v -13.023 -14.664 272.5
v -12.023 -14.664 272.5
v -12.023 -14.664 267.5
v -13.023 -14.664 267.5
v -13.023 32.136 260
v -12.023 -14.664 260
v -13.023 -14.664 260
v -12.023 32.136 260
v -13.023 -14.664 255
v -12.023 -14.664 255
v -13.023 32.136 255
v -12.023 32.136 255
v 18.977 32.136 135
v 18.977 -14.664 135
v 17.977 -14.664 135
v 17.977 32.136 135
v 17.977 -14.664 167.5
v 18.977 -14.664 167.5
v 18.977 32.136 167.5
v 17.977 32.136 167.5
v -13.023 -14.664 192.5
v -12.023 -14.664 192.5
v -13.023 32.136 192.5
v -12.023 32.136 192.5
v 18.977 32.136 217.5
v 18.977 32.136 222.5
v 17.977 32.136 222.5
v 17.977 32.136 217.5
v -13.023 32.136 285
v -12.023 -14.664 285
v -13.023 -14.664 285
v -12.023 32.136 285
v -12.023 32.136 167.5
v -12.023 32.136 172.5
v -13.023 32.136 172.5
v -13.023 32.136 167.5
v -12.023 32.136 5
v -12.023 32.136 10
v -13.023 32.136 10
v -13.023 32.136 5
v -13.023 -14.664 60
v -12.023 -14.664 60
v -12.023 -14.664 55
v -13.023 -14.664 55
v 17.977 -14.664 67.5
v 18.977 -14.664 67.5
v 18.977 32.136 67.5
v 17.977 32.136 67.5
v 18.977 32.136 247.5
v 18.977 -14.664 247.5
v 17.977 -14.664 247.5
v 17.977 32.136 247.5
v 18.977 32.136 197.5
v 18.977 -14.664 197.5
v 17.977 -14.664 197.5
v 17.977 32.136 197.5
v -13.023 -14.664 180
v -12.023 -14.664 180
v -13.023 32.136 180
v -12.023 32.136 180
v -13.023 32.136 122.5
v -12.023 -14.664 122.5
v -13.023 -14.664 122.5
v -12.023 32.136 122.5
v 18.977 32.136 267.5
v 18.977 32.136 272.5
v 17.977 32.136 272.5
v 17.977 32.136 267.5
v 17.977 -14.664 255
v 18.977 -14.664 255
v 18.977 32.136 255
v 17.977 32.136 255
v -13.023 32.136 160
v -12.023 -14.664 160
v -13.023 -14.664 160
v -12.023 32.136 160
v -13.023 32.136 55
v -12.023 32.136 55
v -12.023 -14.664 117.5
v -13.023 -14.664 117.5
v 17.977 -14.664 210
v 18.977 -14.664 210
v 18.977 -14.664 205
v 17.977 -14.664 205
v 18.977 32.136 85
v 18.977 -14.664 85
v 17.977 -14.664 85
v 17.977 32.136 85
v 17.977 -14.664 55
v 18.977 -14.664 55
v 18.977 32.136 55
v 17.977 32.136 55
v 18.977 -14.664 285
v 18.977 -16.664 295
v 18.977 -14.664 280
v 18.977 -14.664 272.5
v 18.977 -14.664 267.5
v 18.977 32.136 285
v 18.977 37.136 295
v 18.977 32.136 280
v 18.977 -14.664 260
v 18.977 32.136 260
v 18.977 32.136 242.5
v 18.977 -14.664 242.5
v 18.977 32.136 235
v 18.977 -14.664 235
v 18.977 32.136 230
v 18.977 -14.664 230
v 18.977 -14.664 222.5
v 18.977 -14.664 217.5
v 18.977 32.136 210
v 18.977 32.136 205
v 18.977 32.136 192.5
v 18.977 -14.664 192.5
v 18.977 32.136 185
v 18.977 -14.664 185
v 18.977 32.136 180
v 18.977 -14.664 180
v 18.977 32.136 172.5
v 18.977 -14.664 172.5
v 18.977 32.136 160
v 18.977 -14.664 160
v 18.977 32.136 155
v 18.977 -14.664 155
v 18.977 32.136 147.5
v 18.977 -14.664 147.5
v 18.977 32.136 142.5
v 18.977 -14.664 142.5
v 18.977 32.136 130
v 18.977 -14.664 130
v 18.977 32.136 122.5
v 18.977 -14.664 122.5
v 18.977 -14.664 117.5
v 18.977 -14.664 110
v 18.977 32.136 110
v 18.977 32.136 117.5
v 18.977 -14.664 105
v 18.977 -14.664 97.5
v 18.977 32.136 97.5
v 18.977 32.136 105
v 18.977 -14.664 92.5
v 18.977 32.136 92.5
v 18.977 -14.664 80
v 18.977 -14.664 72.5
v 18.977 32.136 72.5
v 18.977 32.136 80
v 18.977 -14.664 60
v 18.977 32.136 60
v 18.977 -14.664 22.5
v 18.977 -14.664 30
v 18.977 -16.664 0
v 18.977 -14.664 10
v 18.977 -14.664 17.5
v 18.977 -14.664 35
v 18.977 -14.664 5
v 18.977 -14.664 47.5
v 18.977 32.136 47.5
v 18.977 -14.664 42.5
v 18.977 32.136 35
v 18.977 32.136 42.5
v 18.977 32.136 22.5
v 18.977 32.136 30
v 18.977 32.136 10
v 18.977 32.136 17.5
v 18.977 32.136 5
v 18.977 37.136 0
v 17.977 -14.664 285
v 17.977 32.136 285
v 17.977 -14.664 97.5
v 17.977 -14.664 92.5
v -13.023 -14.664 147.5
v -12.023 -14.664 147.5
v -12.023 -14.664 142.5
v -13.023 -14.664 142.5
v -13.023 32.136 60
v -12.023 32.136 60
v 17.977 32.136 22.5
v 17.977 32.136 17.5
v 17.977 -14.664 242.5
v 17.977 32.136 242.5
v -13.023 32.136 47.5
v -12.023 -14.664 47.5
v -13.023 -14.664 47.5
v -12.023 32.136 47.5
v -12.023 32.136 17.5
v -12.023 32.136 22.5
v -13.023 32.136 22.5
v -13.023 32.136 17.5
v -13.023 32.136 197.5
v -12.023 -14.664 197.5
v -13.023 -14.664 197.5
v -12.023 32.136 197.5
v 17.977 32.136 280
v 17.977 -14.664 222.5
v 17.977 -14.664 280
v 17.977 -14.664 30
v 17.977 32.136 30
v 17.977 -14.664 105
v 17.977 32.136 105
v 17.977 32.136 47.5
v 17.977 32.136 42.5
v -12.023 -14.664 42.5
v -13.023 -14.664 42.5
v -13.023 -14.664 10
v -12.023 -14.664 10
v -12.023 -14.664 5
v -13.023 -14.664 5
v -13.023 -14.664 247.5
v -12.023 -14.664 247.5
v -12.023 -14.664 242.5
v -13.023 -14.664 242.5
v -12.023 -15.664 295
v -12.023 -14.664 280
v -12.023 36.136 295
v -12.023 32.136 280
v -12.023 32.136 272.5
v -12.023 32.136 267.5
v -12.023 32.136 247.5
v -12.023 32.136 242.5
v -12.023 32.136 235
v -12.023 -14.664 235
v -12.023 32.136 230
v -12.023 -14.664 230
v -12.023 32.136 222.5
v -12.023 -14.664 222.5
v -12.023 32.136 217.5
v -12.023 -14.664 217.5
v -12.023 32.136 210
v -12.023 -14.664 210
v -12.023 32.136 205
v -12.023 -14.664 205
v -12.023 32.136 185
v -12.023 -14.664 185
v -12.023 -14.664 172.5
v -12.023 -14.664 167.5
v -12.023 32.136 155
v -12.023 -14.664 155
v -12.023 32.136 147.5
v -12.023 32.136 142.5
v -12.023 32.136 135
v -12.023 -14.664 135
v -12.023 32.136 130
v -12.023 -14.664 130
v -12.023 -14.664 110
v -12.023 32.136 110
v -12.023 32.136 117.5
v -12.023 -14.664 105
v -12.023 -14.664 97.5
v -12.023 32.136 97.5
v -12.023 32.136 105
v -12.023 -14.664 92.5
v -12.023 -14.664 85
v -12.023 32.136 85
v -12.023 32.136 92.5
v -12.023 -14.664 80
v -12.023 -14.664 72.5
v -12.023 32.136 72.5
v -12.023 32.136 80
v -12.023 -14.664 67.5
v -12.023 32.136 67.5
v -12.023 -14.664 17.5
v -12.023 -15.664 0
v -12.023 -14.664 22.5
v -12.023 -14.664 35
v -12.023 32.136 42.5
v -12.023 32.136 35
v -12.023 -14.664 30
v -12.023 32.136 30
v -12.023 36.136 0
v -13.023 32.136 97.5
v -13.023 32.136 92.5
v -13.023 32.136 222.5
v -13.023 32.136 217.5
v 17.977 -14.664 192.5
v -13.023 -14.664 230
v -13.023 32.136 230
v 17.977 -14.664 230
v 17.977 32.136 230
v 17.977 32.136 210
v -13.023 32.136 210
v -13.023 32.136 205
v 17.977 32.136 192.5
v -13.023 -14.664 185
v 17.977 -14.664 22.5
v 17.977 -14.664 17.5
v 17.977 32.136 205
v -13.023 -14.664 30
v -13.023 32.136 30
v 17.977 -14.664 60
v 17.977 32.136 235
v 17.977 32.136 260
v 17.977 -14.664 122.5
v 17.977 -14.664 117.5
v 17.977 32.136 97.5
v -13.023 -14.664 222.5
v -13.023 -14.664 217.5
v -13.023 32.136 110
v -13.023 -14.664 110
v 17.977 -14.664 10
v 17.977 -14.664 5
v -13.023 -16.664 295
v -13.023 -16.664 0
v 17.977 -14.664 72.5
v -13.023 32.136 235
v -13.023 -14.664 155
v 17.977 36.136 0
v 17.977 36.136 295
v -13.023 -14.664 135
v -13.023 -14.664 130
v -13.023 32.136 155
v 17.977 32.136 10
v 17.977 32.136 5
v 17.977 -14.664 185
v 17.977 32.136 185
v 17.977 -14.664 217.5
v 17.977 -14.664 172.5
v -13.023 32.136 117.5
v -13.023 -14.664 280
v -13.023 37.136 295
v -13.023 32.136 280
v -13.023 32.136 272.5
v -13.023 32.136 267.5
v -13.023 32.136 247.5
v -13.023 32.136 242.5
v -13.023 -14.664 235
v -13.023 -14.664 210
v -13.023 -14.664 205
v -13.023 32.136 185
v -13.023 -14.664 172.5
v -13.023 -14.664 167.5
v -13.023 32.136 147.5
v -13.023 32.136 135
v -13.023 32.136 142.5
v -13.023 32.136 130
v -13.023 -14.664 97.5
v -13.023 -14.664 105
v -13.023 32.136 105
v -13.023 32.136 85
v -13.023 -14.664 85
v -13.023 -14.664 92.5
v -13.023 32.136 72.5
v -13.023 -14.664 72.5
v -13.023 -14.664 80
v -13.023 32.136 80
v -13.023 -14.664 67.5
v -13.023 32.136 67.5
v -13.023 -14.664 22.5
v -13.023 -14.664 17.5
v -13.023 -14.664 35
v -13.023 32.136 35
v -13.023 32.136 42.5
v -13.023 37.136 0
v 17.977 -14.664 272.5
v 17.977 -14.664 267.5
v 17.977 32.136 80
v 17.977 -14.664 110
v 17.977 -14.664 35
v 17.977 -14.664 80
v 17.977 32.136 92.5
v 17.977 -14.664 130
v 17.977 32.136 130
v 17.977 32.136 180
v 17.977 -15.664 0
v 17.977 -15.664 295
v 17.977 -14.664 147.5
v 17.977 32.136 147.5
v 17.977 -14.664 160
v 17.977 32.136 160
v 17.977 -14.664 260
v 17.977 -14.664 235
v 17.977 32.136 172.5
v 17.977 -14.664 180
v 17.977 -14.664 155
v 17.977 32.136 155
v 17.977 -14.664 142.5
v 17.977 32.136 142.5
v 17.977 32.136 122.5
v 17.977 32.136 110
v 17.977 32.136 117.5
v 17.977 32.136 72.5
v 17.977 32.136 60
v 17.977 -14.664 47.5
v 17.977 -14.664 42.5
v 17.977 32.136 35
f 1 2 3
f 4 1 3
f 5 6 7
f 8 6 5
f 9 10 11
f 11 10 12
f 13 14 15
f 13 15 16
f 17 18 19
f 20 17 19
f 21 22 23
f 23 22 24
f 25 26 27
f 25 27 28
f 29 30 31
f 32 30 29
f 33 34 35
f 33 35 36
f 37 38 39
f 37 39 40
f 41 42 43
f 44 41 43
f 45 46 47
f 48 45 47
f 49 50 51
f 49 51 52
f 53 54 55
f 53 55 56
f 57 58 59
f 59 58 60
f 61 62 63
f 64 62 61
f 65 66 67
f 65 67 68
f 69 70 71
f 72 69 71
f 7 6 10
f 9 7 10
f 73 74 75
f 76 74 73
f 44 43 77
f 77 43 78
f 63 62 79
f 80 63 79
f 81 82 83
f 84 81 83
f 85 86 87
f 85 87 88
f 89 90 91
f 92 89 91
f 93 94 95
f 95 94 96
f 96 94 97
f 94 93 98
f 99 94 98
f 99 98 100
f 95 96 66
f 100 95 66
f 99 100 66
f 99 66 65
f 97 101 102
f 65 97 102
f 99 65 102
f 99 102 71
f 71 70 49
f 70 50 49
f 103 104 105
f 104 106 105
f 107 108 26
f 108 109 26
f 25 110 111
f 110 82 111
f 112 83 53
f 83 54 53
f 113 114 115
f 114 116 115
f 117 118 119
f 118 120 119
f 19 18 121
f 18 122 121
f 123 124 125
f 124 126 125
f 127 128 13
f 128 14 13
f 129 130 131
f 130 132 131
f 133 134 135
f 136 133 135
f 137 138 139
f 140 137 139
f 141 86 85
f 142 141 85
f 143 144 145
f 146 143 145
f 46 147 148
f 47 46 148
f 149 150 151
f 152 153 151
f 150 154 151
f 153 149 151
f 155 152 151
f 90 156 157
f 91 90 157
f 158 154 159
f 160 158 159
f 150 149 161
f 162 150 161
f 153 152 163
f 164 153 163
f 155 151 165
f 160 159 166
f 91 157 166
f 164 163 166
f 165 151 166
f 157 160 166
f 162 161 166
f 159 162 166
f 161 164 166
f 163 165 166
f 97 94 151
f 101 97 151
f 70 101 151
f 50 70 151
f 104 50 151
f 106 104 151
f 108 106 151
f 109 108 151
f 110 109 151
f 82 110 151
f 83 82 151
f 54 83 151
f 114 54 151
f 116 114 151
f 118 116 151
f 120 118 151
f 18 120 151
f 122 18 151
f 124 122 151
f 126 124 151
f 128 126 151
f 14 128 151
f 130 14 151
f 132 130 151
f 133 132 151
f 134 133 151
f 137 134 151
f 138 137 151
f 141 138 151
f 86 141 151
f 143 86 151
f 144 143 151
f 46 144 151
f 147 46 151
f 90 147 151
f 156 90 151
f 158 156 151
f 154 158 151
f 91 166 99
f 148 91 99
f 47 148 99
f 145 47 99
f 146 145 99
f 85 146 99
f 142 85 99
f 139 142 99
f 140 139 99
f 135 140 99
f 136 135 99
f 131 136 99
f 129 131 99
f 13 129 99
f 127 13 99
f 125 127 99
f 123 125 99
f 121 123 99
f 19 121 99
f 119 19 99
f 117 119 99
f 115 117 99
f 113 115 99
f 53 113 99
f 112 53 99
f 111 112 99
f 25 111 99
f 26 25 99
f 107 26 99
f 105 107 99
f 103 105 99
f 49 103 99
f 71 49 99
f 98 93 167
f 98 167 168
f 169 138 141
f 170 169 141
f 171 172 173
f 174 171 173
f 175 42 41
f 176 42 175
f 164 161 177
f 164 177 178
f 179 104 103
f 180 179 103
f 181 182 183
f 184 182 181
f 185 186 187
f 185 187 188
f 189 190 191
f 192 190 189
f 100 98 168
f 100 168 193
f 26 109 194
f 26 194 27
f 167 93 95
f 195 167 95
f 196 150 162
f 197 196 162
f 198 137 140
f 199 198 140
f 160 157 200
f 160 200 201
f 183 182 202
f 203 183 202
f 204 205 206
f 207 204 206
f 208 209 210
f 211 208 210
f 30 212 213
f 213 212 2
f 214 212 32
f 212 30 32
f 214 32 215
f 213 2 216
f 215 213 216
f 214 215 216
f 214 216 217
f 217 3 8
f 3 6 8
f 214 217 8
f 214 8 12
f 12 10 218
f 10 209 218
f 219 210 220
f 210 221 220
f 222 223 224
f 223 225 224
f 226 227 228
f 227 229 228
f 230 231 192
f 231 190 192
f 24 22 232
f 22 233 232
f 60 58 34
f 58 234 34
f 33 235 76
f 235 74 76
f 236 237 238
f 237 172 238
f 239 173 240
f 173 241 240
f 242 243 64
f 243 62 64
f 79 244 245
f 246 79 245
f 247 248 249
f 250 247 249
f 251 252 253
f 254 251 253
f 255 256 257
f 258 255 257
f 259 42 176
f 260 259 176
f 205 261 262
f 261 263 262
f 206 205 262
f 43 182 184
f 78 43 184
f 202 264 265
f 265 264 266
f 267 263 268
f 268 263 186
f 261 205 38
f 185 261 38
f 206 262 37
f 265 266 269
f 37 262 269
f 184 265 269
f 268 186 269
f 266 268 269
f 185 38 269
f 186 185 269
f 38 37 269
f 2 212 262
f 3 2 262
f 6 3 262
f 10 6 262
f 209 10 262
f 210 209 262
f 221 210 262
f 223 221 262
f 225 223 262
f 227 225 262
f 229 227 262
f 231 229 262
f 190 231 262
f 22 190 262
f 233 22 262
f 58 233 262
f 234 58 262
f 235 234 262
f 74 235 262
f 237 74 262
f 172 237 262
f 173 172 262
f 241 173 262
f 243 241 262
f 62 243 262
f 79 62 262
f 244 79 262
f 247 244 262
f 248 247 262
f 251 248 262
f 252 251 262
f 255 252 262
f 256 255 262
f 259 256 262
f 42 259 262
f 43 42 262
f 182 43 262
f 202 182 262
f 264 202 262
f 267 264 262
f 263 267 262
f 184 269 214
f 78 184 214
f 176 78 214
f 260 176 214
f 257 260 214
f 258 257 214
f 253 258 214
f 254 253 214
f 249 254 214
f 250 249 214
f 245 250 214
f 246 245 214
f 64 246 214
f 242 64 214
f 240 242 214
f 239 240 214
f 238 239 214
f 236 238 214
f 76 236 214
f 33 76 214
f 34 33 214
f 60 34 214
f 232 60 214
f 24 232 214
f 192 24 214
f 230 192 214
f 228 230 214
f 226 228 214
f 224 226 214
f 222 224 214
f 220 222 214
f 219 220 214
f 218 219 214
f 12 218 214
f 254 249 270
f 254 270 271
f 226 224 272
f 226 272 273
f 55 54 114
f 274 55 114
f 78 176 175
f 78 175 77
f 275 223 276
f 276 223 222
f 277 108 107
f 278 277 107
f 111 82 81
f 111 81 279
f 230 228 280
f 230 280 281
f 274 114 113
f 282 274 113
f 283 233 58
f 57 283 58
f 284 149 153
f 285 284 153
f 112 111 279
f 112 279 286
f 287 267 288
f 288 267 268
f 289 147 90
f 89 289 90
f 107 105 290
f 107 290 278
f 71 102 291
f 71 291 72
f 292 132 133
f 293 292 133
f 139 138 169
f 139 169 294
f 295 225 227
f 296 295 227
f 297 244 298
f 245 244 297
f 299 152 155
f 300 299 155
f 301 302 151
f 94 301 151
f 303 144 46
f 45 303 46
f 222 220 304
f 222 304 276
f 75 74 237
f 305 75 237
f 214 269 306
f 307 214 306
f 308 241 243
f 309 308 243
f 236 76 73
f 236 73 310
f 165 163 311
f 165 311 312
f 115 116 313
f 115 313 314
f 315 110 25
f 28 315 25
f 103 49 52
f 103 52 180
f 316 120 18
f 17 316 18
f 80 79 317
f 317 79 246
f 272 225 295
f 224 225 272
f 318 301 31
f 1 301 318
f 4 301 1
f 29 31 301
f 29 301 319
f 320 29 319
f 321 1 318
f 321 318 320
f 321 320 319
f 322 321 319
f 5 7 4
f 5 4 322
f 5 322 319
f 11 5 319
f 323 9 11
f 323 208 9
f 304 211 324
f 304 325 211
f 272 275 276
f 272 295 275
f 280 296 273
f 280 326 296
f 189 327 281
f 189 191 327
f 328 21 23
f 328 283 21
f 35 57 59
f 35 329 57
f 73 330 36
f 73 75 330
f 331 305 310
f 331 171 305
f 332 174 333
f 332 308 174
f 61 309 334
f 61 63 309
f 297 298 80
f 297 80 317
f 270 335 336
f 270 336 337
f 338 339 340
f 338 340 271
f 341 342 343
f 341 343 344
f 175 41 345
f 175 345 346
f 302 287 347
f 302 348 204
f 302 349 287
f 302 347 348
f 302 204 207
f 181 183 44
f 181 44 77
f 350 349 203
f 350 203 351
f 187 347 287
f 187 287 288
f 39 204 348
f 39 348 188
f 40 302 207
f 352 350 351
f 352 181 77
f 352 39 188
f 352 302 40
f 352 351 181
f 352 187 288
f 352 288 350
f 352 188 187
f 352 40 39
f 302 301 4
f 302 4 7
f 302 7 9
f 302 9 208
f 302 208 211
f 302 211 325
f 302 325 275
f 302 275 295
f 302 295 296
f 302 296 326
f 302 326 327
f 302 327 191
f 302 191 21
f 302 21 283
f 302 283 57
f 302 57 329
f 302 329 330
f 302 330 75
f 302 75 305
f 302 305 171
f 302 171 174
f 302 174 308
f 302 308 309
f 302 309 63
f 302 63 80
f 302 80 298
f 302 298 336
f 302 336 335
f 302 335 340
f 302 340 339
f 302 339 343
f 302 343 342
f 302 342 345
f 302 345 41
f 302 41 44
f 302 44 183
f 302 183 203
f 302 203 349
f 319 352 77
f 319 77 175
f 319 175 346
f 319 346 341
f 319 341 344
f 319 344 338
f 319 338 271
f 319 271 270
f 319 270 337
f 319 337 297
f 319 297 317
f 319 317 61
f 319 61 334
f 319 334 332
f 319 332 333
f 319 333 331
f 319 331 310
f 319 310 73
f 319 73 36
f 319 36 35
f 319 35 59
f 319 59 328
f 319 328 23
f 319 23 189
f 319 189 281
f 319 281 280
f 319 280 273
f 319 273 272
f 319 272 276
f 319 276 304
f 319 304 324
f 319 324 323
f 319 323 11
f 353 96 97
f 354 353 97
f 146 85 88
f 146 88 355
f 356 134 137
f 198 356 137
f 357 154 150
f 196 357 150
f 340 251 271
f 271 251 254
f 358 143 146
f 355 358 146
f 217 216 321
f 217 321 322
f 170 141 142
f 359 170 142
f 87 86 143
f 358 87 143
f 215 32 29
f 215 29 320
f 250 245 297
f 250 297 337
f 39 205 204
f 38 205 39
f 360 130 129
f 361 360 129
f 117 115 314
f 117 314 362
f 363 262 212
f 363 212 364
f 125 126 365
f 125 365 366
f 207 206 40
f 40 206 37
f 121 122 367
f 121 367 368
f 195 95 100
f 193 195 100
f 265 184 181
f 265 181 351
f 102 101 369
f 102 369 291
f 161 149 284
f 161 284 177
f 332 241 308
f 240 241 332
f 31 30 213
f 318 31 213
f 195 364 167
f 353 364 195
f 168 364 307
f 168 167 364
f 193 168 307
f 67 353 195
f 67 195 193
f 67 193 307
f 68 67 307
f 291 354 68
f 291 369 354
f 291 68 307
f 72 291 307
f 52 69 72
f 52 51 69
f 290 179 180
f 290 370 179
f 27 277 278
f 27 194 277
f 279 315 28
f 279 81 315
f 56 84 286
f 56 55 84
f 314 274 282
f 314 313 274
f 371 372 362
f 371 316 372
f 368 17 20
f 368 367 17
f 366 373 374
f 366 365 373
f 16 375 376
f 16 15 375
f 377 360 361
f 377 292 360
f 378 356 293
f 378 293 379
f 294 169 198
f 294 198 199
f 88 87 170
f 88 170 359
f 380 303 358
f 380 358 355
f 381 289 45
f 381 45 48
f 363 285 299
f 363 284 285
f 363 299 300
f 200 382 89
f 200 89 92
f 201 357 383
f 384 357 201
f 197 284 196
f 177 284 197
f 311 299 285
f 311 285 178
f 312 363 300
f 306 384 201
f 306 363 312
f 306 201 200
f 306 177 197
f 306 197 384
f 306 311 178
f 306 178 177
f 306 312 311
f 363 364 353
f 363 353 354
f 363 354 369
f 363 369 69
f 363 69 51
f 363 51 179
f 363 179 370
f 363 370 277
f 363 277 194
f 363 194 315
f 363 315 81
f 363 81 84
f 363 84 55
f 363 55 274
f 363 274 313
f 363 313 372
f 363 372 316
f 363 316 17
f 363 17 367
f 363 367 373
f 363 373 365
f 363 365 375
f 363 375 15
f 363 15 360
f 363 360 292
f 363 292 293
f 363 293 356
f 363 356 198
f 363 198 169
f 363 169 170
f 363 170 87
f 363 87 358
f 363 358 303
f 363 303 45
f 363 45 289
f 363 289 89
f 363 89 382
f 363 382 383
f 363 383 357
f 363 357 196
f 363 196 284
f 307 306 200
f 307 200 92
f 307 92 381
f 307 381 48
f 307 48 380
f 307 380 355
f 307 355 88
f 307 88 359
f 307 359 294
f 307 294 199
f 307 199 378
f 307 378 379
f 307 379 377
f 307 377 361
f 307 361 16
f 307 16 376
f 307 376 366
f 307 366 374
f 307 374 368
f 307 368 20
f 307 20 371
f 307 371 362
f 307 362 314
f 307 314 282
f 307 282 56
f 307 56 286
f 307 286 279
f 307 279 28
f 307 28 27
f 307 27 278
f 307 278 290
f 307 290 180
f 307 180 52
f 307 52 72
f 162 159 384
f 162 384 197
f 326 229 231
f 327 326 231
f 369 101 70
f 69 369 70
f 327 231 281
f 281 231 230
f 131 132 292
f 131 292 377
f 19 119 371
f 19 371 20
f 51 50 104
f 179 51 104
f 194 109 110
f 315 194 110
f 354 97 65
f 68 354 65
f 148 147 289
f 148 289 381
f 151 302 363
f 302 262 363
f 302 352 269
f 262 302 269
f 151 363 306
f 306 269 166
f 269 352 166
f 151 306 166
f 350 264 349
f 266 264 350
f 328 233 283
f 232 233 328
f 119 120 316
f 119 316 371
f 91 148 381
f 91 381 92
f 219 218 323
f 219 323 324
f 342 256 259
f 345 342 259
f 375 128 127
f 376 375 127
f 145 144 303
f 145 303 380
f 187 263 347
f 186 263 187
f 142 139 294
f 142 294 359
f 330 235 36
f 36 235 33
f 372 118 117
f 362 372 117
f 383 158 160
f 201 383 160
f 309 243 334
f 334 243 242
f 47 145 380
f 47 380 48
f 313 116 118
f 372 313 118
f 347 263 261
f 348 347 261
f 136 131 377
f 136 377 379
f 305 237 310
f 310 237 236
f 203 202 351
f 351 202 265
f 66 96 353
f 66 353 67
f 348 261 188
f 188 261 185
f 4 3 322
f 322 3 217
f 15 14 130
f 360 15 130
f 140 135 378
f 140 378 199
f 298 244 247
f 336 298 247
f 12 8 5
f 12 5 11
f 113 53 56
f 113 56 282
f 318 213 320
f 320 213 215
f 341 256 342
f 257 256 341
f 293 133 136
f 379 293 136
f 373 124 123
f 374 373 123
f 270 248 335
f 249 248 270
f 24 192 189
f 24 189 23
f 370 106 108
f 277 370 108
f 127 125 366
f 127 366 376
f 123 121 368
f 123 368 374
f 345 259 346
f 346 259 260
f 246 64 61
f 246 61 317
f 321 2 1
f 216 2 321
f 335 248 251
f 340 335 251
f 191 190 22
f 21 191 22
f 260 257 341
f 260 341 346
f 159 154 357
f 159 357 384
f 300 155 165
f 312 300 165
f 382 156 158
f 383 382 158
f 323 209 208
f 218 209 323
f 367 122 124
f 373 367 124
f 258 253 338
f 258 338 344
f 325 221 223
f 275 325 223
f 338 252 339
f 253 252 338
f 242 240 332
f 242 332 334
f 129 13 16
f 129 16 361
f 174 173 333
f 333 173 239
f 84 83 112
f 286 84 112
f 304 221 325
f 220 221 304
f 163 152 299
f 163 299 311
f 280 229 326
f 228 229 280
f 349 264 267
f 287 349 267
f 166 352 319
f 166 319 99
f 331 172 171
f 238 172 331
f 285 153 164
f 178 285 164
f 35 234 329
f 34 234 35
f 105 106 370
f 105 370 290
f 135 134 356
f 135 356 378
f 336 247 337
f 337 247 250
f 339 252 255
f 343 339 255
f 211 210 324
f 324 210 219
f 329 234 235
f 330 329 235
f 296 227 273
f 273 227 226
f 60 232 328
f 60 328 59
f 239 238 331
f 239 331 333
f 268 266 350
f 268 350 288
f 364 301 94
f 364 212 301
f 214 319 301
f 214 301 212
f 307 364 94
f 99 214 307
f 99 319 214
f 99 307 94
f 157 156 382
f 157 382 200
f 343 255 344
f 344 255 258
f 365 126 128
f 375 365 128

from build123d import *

# Parameters (mm, degrees)
ESQUISSE1_W                = 32
ESQUISSE1_H                = 53.8
ESQUISSE1_W_2              = 30
ESQUISSE1_H_2              = 51.8
BOSS_EXTRU_1_DEPTH         = 295
ESQUISSE2_W                = 5
ESQUISSE2_H                = 46.8
ENL_V_MAT_EXTRU_1_DEPTH    = 32
R_P_TITION_LIN_AIRE1_COUNT = 23
R_P_TITION_LIN_AIRE1_PITCH = 12.5


with BuildPart() as part:
    # Esquisse1 → Boss.-Extru.1 (new body)
    with BuildSketch(Plane.XY):
        with Locations((2.977116986, 10.236099585)):
            Rectangle(ESQUISSE1_W, ESQUISSE1_H)
        with Locations((2.977116986, 10.236099585)):
            Rectangle(ESQUISSE1_W_2, ESQUISSE1_H_2, mode=Mode.SUBTRACT)
    extrude(amount=BOSS_EXTRU_1_DEPTH)

    # Esquisse2 → Enlèv. mat.-Extru.1 (cut)
    with BuildSketch(Plane(origin=(18.977116986, 0, 0), x_dir=(0, 0, -1), z_dir=(1, 0, 0))):
        with Locations((-7.5, 8.736099585)):
            Rectangle(ESQUISSE2_W, ESQUISSE2_H)
    enl_v_mat_extru_1 = extrude(amount=-ENL_V_MAT_EXTRU_1_DEPTH, mode=Mode.SUBTRACT)

    # Répétition linéaire1: Enlèv. mat.-Extru.1 ×23
    with Locations(*[(0, 0, i * R_P_TITION_LIN_AIRE1_PITCH) for i in range(1, R_P_TITION_LIN_AIRE1_COUNT)]):
        add(enl_v_mat_extru_1, mode=Mode.SUBTRACT)


solid = part.part
